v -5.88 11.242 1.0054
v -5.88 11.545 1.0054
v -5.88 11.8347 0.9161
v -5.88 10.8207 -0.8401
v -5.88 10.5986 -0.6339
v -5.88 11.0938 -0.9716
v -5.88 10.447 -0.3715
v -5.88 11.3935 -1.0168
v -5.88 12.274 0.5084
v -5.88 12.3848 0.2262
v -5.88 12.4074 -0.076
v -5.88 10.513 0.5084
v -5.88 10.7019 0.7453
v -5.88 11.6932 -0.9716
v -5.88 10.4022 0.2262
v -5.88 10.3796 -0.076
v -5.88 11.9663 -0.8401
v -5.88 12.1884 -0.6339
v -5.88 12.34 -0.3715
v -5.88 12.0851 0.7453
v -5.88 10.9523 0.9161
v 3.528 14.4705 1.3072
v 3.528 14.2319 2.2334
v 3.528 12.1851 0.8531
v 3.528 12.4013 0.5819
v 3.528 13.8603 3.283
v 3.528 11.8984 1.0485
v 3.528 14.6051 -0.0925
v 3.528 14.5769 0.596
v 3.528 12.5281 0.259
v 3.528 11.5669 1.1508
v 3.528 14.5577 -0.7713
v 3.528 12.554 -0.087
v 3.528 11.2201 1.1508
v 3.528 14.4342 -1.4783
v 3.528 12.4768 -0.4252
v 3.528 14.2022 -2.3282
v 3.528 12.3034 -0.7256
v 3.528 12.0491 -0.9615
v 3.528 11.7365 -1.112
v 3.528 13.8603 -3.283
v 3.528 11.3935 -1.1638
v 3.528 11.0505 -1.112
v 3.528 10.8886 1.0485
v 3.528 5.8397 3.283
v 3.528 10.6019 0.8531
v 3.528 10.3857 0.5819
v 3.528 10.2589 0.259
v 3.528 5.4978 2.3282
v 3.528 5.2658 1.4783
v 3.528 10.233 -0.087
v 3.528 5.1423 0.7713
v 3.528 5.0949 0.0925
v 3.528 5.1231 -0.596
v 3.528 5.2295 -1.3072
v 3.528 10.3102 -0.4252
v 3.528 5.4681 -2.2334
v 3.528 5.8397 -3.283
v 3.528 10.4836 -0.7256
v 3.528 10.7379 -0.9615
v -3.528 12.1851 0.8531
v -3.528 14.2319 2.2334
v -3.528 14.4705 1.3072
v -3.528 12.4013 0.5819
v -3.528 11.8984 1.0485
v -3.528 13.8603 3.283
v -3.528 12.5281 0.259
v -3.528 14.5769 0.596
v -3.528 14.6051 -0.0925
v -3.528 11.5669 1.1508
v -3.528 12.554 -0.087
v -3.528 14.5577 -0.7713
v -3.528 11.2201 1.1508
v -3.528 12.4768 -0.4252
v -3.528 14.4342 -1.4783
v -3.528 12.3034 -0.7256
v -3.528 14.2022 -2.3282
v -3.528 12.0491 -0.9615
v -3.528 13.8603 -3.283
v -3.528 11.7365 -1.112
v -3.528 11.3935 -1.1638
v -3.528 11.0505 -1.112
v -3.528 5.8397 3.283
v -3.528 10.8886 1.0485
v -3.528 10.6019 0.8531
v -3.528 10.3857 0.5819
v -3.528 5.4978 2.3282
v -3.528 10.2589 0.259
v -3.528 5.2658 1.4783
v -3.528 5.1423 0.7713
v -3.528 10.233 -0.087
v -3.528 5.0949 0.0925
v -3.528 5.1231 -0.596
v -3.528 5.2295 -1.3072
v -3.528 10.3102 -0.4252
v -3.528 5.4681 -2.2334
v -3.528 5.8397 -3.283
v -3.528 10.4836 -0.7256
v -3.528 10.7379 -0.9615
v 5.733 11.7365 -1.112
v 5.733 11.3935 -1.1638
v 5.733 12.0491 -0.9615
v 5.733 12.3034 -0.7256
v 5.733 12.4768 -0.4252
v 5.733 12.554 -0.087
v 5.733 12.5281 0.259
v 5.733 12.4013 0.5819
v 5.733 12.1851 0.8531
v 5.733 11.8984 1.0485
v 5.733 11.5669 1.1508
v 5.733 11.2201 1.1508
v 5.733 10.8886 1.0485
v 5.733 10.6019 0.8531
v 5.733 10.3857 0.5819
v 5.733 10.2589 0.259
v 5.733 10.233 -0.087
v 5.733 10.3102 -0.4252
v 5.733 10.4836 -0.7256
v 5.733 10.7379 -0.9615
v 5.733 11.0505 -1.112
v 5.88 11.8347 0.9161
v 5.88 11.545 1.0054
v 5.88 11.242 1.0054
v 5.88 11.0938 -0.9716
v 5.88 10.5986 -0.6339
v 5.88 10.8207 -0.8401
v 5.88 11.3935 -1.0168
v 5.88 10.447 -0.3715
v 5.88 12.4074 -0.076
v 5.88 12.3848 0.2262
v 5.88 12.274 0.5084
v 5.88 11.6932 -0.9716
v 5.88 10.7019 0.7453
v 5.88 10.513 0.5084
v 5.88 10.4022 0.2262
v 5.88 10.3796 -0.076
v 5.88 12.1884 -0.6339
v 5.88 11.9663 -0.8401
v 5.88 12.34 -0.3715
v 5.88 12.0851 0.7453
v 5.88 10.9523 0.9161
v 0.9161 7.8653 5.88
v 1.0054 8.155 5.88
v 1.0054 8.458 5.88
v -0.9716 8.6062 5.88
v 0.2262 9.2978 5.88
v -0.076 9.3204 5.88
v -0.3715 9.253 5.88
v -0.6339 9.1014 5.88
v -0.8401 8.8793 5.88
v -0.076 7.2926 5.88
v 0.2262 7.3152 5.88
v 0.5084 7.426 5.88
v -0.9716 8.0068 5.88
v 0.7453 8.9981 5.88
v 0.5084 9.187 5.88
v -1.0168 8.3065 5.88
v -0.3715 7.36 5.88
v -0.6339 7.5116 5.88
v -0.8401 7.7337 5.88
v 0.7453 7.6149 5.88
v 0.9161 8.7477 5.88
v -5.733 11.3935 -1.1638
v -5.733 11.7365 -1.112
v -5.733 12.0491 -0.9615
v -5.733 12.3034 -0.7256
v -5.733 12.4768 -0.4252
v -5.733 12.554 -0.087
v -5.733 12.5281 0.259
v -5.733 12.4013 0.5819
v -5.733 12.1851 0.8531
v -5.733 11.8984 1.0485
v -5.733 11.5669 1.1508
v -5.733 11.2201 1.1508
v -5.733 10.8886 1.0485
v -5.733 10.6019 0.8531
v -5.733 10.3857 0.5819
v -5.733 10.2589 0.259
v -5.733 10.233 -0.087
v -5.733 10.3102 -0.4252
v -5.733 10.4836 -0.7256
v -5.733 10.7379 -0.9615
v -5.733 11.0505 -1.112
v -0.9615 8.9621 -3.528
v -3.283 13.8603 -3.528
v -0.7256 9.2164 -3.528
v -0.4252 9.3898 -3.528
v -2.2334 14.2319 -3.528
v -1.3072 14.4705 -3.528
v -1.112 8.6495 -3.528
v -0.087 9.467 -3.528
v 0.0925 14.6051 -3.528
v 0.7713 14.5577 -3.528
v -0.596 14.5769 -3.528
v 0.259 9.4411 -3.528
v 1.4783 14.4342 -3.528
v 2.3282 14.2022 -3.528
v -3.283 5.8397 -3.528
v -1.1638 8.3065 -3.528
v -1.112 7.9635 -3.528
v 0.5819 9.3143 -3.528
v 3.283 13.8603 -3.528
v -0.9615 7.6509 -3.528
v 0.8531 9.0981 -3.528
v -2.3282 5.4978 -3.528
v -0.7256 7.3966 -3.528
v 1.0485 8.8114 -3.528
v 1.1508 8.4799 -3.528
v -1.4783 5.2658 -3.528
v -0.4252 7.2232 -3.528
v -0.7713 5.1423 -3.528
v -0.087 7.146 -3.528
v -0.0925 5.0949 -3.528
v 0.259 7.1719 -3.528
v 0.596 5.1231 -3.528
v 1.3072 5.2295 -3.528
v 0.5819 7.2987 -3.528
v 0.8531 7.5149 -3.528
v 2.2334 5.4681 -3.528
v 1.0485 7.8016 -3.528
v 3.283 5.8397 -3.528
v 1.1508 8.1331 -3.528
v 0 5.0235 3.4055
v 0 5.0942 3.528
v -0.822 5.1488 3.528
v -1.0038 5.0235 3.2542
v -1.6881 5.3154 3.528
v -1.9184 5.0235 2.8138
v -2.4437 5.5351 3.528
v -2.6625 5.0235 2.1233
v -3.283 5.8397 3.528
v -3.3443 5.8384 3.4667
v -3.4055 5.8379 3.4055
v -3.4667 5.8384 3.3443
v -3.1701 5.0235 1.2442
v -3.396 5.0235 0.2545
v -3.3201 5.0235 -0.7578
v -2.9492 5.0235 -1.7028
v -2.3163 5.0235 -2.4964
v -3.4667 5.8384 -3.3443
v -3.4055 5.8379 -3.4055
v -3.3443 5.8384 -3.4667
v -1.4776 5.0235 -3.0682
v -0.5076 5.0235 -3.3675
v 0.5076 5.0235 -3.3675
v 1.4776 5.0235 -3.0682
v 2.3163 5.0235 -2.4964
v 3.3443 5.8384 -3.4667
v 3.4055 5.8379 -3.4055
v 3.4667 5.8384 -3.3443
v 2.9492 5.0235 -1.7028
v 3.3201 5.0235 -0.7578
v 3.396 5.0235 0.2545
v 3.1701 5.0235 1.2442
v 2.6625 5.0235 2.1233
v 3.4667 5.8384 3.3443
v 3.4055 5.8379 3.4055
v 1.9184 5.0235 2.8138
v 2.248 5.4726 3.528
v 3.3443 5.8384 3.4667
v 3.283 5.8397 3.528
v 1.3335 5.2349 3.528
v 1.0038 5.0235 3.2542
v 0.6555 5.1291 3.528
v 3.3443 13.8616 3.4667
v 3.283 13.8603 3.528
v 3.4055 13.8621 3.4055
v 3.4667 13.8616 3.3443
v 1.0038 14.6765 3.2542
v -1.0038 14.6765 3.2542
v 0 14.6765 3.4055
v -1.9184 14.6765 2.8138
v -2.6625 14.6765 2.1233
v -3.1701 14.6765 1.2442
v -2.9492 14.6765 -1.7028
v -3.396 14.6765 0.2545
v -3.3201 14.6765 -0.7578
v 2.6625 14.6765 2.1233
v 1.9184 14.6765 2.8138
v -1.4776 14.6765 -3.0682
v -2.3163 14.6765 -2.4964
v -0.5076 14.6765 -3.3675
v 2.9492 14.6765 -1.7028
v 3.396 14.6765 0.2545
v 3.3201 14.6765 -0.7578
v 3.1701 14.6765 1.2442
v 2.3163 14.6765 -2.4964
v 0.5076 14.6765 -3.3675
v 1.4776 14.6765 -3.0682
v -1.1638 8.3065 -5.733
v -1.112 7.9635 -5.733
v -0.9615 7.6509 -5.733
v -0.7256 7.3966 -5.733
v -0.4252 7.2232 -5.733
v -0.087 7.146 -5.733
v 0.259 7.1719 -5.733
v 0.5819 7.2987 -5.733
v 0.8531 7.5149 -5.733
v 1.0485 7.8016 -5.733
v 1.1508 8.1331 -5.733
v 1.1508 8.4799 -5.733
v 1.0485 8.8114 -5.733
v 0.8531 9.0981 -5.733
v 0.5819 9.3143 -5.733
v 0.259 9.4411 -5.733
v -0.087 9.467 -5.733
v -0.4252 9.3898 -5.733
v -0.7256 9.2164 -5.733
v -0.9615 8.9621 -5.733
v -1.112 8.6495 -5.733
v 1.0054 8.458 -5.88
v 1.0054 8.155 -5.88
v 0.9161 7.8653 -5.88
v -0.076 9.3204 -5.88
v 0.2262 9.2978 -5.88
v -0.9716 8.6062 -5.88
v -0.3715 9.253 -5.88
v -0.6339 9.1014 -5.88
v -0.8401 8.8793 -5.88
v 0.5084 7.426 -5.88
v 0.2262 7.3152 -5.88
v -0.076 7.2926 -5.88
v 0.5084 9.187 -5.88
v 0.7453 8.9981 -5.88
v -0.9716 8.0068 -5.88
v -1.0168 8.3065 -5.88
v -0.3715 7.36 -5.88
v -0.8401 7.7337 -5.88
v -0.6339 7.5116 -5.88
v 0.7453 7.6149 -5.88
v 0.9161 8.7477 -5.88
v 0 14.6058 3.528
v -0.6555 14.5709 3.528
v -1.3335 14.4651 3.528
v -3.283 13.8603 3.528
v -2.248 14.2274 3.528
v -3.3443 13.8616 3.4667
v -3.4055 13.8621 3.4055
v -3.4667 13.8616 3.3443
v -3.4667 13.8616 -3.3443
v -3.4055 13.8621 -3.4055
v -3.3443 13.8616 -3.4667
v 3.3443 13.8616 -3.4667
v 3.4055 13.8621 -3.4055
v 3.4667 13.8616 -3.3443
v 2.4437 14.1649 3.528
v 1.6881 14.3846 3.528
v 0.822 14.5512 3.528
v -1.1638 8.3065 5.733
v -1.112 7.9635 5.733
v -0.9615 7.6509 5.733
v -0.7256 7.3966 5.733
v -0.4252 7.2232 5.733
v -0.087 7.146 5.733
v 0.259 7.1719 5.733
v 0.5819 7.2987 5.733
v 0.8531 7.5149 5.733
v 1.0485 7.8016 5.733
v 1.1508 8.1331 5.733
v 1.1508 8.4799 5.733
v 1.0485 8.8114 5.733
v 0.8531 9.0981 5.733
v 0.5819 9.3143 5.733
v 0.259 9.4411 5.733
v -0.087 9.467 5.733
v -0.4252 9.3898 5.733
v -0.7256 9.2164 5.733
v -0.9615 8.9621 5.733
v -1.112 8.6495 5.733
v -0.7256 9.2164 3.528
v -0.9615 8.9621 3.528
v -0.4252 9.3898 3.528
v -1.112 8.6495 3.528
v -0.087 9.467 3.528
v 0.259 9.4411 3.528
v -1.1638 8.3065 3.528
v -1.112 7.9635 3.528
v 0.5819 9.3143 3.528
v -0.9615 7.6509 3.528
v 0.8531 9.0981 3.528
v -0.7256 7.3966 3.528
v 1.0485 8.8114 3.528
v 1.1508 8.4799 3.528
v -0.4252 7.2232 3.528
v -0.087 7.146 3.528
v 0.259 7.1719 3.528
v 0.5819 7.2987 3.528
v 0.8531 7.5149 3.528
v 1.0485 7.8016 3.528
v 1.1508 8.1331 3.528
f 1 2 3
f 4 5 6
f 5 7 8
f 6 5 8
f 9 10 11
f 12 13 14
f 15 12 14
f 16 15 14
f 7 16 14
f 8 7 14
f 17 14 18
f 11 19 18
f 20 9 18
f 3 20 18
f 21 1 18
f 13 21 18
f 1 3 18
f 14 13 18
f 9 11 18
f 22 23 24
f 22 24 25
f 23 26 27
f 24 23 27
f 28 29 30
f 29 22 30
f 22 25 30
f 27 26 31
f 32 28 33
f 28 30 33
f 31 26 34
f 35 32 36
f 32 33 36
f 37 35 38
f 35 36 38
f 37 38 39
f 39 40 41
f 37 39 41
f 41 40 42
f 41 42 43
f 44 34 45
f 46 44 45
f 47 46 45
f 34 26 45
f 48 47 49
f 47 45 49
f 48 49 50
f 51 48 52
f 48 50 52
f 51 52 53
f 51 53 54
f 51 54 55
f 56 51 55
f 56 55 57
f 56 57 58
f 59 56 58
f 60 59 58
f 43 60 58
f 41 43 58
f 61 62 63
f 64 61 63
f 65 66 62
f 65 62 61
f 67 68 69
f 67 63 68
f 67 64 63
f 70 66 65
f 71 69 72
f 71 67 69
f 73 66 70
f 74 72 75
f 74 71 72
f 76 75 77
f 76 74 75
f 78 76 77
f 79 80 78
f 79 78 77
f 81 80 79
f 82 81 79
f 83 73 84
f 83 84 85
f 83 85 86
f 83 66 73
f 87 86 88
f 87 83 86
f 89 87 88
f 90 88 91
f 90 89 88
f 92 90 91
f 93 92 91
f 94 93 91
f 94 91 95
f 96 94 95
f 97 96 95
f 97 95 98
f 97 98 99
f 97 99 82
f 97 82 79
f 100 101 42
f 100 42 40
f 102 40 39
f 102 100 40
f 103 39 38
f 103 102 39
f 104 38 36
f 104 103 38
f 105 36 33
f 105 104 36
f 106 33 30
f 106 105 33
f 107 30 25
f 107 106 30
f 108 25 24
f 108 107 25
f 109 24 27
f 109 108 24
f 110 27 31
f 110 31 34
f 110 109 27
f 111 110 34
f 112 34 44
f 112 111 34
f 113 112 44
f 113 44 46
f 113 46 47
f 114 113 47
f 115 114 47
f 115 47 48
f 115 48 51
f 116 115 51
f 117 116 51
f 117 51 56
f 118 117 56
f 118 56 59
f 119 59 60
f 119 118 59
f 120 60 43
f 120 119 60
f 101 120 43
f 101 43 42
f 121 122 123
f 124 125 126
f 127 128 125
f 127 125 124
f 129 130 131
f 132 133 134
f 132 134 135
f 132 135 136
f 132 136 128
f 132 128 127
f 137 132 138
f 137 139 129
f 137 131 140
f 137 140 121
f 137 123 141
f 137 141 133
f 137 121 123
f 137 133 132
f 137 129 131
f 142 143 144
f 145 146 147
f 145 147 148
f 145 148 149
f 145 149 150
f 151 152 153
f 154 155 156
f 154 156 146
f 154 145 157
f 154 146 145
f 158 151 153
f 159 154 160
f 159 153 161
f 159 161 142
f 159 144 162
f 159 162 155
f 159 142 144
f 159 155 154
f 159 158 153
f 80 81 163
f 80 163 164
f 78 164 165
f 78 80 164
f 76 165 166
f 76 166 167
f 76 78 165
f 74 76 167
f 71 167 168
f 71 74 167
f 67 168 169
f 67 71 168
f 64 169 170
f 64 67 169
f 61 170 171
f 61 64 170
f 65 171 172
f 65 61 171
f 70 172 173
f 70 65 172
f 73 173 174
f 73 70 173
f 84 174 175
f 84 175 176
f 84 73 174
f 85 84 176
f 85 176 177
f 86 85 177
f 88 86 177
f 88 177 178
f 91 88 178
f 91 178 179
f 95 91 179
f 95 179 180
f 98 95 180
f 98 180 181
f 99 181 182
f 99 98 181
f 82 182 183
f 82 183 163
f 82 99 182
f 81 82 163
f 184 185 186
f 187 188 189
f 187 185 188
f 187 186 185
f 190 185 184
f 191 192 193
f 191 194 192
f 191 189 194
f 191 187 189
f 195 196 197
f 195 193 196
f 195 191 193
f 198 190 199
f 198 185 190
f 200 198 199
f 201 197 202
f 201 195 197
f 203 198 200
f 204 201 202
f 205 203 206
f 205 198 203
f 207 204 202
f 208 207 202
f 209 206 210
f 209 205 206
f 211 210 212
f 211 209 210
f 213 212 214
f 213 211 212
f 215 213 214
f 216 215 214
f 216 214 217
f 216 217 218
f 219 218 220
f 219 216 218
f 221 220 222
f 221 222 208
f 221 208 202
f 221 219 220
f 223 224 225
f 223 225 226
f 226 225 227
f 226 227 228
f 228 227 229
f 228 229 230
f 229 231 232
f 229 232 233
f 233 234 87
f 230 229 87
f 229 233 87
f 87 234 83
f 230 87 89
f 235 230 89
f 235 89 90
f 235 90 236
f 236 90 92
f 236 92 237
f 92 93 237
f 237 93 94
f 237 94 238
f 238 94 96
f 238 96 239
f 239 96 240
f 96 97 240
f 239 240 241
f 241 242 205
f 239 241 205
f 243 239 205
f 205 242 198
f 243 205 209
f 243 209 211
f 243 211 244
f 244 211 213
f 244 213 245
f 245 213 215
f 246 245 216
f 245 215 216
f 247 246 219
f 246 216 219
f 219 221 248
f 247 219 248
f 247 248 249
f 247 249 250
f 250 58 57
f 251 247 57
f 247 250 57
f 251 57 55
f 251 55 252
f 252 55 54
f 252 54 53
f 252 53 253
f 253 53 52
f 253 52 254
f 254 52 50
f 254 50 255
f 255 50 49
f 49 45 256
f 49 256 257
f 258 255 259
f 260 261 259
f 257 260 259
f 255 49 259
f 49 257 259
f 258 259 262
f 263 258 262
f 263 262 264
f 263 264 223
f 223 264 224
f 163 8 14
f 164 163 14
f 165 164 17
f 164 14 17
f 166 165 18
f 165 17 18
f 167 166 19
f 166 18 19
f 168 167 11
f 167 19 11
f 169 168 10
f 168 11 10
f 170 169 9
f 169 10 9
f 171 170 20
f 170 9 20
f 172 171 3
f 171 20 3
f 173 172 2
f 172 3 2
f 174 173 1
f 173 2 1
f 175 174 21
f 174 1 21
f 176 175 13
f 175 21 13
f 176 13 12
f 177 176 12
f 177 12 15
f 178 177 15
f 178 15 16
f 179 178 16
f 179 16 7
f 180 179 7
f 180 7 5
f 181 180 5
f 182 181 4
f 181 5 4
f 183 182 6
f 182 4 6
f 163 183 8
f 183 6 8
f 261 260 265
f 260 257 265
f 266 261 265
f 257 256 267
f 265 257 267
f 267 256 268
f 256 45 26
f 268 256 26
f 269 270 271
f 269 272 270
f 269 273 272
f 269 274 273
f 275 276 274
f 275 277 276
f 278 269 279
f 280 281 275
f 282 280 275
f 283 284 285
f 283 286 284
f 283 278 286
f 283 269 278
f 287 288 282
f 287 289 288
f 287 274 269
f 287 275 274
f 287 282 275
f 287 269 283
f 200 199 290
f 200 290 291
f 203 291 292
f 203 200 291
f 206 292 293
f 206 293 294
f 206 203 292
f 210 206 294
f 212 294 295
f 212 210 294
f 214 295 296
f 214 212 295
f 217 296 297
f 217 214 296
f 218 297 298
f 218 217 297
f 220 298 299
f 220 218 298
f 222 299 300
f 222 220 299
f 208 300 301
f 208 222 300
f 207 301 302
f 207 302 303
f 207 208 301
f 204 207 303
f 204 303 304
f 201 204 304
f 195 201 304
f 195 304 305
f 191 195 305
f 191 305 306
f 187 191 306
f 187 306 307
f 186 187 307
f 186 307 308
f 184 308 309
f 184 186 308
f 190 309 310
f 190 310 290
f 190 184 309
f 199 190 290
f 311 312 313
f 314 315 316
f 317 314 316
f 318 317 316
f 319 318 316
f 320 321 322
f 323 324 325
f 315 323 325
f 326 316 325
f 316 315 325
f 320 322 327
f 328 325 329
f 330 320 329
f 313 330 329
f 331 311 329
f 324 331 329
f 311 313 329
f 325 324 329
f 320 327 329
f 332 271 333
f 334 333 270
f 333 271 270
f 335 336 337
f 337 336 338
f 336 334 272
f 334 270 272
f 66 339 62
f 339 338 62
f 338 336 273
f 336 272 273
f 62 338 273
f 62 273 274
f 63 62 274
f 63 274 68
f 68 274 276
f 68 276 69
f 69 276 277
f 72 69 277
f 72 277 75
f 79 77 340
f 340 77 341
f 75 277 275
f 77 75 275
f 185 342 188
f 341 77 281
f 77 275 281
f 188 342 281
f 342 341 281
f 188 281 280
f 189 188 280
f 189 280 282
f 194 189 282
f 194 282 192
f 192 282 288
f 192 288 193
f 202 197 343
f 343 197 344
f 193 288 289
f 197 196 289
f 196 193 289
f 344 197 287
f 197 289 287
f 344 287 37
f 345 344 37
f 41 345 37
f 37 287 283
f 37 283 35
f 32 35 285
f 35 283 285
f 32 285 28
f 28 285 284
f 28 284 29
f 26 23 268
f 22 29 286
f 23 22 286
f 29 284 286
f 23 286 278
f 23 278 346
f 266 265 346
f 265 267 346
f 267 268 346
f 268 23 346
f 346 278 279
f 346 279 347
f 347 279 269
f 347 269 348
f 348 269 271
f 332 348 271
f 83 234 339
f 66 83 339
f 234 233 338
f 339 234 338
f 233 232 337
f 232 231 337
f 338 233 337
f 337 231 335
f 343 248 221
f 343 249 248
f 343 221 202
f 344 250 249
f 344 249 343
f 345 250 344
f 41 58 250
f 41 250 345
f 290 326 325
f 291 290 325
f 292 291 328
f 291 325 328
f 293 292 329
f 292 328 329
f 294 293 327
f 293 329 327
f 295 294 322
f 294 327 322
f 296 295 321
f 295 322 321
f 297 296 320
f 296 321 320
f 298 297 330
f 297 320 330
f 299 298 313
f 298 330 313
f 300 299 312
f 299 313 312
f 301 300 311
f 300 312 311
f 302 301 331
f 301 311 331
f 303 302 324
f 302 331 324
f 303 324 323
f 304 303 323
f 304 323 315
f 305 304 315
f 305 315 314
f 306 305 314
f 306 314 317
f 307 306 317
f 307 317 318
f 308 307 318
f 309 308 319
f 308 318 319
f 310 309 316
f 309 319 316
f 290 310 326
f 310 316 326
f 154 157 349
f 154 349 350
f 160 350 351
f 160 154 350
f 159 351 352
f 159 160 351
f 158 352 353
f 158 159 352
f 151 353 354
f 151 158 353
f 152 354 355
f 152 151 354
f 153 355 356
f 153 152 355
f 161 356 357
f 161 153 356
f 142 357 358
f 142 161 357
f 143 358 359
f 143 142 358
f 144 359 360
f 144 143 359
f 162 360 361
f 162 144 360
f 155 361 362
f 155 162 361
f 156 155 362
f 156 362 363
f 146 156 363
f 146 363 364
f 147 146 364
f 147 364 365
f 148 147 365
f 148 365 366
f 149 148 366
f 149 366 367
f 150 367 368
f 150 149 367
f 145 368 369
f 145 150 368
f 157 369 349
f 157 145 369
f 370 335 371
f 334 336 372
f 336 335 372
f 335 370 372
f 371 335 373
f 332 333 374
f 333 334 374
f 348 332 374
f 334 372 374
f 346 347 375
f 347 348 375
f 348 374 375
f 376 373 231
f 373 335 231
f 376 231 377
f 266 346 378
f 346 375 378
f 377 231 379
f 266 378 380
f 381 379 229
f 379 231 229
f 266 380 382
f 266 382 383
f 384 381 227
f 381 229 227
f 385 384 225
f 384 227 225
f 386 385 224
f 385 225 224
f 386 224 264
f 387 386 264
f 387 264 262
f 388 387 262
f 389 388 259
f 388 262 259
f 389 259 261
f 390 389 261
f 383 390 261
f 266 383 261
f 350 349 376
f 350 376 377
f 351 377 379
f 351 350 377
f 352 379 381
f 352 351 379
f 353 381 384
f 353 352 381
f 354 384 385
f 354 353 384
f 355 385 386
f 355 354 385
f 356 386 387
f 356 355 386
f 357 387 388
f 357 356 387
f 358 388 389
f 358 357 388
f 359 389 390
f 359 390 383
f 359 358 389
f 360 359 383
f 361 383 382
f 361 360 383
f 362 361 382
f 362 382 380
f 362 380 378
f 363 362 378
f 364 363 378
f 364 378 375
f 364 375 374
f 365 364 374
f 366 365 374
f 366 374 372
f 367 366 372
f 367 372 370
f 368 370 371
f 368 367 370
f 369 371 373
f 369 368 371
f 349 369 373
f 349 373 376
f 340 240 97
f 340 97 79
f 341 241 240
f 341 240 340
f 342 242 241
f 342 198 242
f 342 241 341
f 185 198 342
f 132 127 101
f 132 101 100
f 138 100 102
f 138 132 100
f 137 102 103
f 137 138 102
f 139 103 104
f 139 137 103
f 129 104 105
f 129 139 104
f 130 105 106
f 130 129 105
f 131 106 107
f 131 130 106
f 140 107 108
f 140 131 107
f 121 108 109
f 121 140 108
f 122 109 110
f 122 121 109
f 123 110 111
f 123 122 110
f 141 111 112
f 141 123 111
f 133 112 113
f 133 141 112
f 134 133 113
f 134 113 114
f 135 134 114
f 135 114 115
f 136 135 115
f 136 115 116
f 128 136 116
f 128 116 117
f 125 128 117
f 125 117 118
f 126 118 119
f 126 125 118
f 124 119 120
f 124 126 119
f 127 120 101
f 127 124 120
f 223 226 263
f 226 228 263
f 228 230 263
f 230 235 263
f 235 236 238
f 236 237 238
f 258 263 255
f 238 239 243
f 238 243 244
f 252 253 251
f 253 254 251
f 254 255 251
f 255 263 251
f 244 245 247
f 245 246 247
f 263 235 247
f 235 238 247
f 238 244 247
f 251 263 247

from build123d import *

# Parameters (mm, degrees)
SKETCH1_W           = 14.4
SKETCH1_H           = 14.4
BOSS_EXTRUDE1_DEPTH = 19.7
SKETCH3_R           = 2.375
BOSS_EXTRUDE2_DEPTH = 12
SKETCH4_R           = 2.375
BOSS_EXTRUDE3_DEPTH = 12
CHAMFER1_SIZE       = 0.3
CHAMFER2_SIZE       = 0.5
SCALE1_SCALE        = 0.49


with BuildPart() as part:
    # Sketch1 → Boss-Extrude1 (new body)
    with BuildSketch(Plane(origin=(0, 0, 0), x_dir=(1, 0, 0), z_dir=(0, 1, 0))):
        Rectangle(SKETCH1_W, SKETCH1_H)
    extrude(amount=BOSS_EXTRUDE1_DEPTH)

    # Sketch2 → Cut-Revolve1 (revolve, cut)
    with BuildSketch(Plane.XY, mode=Mode.PRIVATE) as cut_revolve1_sk:
        Polygon((-6.95, 19.7), (-16.09, 19.7), (-16.09, 0), (-6.95, 0), (-13.55, 3.810511777), (-13.55, 15.889488223), align=None)
    revolve(cut_revolve1_sk.sketch.rotate(Axis((0, 20.685, 0), (0, -1, 0)), 270), axis=Axis((0, 20.685, 0), (0, -1, 0)), mode=Mode.SUBTRACT)

    # Sketch3 → Boss-Extrude2 (add, symmetric)
    with BuildSketch(Plane.XY):
        with Locations(Location((0, 6.7, 0), (0, 0, 180))):
            Circle(SKETCH3_R)
    extrude(amount=BOSS_EXTRUDE2_DEPTH, both=True)

    # Sketch4 → Boss-Extrude3 (add, symmetric)
    with BuildSketch(Plane(origin=(0, 0, 0), x_dir=(0, 0, -1), z_dir=(1, 0, 0))):
        with Locations((0, 13)):
            Circle(SKETCH4_R)
    extrude(amount=BOSS_EXTRUDE3_DEPTH, both=True)

    # Chamfer1
    chamfer1_edges = [part.edges().sort_by_distance(p)[0] for p in [
        (2.375, 6.7, -12),
        (2.375, 6.7, 12),
        (-12, 13, 2.375),
        (12, 13, 2.375),
    ]]
    chamfer(chamfer1_edges, length=CHAMFER1_SIZE)

    # Chamfer2
    chamfer2_edges = [part.edges().sort_by_distance(p)[0] for p in [
        (7.2, 9.85, 7.2),
        (7.2, 9.85, -7.2),
        (-7.2, 9.85, 7.2),
        (-7.2, 9.85, -7.2),
    ]]
    chamfer(chamfer2_edges, length=CHAMFER2_SIZE)


with BuildPart() as part_1:
    # Scale1: scaled about (0, 9.85, 0)
    add(part.part.scale(SCALE1_SCALE).moved(Location((0, 5.0235, 0))))


solid = part_1.part
